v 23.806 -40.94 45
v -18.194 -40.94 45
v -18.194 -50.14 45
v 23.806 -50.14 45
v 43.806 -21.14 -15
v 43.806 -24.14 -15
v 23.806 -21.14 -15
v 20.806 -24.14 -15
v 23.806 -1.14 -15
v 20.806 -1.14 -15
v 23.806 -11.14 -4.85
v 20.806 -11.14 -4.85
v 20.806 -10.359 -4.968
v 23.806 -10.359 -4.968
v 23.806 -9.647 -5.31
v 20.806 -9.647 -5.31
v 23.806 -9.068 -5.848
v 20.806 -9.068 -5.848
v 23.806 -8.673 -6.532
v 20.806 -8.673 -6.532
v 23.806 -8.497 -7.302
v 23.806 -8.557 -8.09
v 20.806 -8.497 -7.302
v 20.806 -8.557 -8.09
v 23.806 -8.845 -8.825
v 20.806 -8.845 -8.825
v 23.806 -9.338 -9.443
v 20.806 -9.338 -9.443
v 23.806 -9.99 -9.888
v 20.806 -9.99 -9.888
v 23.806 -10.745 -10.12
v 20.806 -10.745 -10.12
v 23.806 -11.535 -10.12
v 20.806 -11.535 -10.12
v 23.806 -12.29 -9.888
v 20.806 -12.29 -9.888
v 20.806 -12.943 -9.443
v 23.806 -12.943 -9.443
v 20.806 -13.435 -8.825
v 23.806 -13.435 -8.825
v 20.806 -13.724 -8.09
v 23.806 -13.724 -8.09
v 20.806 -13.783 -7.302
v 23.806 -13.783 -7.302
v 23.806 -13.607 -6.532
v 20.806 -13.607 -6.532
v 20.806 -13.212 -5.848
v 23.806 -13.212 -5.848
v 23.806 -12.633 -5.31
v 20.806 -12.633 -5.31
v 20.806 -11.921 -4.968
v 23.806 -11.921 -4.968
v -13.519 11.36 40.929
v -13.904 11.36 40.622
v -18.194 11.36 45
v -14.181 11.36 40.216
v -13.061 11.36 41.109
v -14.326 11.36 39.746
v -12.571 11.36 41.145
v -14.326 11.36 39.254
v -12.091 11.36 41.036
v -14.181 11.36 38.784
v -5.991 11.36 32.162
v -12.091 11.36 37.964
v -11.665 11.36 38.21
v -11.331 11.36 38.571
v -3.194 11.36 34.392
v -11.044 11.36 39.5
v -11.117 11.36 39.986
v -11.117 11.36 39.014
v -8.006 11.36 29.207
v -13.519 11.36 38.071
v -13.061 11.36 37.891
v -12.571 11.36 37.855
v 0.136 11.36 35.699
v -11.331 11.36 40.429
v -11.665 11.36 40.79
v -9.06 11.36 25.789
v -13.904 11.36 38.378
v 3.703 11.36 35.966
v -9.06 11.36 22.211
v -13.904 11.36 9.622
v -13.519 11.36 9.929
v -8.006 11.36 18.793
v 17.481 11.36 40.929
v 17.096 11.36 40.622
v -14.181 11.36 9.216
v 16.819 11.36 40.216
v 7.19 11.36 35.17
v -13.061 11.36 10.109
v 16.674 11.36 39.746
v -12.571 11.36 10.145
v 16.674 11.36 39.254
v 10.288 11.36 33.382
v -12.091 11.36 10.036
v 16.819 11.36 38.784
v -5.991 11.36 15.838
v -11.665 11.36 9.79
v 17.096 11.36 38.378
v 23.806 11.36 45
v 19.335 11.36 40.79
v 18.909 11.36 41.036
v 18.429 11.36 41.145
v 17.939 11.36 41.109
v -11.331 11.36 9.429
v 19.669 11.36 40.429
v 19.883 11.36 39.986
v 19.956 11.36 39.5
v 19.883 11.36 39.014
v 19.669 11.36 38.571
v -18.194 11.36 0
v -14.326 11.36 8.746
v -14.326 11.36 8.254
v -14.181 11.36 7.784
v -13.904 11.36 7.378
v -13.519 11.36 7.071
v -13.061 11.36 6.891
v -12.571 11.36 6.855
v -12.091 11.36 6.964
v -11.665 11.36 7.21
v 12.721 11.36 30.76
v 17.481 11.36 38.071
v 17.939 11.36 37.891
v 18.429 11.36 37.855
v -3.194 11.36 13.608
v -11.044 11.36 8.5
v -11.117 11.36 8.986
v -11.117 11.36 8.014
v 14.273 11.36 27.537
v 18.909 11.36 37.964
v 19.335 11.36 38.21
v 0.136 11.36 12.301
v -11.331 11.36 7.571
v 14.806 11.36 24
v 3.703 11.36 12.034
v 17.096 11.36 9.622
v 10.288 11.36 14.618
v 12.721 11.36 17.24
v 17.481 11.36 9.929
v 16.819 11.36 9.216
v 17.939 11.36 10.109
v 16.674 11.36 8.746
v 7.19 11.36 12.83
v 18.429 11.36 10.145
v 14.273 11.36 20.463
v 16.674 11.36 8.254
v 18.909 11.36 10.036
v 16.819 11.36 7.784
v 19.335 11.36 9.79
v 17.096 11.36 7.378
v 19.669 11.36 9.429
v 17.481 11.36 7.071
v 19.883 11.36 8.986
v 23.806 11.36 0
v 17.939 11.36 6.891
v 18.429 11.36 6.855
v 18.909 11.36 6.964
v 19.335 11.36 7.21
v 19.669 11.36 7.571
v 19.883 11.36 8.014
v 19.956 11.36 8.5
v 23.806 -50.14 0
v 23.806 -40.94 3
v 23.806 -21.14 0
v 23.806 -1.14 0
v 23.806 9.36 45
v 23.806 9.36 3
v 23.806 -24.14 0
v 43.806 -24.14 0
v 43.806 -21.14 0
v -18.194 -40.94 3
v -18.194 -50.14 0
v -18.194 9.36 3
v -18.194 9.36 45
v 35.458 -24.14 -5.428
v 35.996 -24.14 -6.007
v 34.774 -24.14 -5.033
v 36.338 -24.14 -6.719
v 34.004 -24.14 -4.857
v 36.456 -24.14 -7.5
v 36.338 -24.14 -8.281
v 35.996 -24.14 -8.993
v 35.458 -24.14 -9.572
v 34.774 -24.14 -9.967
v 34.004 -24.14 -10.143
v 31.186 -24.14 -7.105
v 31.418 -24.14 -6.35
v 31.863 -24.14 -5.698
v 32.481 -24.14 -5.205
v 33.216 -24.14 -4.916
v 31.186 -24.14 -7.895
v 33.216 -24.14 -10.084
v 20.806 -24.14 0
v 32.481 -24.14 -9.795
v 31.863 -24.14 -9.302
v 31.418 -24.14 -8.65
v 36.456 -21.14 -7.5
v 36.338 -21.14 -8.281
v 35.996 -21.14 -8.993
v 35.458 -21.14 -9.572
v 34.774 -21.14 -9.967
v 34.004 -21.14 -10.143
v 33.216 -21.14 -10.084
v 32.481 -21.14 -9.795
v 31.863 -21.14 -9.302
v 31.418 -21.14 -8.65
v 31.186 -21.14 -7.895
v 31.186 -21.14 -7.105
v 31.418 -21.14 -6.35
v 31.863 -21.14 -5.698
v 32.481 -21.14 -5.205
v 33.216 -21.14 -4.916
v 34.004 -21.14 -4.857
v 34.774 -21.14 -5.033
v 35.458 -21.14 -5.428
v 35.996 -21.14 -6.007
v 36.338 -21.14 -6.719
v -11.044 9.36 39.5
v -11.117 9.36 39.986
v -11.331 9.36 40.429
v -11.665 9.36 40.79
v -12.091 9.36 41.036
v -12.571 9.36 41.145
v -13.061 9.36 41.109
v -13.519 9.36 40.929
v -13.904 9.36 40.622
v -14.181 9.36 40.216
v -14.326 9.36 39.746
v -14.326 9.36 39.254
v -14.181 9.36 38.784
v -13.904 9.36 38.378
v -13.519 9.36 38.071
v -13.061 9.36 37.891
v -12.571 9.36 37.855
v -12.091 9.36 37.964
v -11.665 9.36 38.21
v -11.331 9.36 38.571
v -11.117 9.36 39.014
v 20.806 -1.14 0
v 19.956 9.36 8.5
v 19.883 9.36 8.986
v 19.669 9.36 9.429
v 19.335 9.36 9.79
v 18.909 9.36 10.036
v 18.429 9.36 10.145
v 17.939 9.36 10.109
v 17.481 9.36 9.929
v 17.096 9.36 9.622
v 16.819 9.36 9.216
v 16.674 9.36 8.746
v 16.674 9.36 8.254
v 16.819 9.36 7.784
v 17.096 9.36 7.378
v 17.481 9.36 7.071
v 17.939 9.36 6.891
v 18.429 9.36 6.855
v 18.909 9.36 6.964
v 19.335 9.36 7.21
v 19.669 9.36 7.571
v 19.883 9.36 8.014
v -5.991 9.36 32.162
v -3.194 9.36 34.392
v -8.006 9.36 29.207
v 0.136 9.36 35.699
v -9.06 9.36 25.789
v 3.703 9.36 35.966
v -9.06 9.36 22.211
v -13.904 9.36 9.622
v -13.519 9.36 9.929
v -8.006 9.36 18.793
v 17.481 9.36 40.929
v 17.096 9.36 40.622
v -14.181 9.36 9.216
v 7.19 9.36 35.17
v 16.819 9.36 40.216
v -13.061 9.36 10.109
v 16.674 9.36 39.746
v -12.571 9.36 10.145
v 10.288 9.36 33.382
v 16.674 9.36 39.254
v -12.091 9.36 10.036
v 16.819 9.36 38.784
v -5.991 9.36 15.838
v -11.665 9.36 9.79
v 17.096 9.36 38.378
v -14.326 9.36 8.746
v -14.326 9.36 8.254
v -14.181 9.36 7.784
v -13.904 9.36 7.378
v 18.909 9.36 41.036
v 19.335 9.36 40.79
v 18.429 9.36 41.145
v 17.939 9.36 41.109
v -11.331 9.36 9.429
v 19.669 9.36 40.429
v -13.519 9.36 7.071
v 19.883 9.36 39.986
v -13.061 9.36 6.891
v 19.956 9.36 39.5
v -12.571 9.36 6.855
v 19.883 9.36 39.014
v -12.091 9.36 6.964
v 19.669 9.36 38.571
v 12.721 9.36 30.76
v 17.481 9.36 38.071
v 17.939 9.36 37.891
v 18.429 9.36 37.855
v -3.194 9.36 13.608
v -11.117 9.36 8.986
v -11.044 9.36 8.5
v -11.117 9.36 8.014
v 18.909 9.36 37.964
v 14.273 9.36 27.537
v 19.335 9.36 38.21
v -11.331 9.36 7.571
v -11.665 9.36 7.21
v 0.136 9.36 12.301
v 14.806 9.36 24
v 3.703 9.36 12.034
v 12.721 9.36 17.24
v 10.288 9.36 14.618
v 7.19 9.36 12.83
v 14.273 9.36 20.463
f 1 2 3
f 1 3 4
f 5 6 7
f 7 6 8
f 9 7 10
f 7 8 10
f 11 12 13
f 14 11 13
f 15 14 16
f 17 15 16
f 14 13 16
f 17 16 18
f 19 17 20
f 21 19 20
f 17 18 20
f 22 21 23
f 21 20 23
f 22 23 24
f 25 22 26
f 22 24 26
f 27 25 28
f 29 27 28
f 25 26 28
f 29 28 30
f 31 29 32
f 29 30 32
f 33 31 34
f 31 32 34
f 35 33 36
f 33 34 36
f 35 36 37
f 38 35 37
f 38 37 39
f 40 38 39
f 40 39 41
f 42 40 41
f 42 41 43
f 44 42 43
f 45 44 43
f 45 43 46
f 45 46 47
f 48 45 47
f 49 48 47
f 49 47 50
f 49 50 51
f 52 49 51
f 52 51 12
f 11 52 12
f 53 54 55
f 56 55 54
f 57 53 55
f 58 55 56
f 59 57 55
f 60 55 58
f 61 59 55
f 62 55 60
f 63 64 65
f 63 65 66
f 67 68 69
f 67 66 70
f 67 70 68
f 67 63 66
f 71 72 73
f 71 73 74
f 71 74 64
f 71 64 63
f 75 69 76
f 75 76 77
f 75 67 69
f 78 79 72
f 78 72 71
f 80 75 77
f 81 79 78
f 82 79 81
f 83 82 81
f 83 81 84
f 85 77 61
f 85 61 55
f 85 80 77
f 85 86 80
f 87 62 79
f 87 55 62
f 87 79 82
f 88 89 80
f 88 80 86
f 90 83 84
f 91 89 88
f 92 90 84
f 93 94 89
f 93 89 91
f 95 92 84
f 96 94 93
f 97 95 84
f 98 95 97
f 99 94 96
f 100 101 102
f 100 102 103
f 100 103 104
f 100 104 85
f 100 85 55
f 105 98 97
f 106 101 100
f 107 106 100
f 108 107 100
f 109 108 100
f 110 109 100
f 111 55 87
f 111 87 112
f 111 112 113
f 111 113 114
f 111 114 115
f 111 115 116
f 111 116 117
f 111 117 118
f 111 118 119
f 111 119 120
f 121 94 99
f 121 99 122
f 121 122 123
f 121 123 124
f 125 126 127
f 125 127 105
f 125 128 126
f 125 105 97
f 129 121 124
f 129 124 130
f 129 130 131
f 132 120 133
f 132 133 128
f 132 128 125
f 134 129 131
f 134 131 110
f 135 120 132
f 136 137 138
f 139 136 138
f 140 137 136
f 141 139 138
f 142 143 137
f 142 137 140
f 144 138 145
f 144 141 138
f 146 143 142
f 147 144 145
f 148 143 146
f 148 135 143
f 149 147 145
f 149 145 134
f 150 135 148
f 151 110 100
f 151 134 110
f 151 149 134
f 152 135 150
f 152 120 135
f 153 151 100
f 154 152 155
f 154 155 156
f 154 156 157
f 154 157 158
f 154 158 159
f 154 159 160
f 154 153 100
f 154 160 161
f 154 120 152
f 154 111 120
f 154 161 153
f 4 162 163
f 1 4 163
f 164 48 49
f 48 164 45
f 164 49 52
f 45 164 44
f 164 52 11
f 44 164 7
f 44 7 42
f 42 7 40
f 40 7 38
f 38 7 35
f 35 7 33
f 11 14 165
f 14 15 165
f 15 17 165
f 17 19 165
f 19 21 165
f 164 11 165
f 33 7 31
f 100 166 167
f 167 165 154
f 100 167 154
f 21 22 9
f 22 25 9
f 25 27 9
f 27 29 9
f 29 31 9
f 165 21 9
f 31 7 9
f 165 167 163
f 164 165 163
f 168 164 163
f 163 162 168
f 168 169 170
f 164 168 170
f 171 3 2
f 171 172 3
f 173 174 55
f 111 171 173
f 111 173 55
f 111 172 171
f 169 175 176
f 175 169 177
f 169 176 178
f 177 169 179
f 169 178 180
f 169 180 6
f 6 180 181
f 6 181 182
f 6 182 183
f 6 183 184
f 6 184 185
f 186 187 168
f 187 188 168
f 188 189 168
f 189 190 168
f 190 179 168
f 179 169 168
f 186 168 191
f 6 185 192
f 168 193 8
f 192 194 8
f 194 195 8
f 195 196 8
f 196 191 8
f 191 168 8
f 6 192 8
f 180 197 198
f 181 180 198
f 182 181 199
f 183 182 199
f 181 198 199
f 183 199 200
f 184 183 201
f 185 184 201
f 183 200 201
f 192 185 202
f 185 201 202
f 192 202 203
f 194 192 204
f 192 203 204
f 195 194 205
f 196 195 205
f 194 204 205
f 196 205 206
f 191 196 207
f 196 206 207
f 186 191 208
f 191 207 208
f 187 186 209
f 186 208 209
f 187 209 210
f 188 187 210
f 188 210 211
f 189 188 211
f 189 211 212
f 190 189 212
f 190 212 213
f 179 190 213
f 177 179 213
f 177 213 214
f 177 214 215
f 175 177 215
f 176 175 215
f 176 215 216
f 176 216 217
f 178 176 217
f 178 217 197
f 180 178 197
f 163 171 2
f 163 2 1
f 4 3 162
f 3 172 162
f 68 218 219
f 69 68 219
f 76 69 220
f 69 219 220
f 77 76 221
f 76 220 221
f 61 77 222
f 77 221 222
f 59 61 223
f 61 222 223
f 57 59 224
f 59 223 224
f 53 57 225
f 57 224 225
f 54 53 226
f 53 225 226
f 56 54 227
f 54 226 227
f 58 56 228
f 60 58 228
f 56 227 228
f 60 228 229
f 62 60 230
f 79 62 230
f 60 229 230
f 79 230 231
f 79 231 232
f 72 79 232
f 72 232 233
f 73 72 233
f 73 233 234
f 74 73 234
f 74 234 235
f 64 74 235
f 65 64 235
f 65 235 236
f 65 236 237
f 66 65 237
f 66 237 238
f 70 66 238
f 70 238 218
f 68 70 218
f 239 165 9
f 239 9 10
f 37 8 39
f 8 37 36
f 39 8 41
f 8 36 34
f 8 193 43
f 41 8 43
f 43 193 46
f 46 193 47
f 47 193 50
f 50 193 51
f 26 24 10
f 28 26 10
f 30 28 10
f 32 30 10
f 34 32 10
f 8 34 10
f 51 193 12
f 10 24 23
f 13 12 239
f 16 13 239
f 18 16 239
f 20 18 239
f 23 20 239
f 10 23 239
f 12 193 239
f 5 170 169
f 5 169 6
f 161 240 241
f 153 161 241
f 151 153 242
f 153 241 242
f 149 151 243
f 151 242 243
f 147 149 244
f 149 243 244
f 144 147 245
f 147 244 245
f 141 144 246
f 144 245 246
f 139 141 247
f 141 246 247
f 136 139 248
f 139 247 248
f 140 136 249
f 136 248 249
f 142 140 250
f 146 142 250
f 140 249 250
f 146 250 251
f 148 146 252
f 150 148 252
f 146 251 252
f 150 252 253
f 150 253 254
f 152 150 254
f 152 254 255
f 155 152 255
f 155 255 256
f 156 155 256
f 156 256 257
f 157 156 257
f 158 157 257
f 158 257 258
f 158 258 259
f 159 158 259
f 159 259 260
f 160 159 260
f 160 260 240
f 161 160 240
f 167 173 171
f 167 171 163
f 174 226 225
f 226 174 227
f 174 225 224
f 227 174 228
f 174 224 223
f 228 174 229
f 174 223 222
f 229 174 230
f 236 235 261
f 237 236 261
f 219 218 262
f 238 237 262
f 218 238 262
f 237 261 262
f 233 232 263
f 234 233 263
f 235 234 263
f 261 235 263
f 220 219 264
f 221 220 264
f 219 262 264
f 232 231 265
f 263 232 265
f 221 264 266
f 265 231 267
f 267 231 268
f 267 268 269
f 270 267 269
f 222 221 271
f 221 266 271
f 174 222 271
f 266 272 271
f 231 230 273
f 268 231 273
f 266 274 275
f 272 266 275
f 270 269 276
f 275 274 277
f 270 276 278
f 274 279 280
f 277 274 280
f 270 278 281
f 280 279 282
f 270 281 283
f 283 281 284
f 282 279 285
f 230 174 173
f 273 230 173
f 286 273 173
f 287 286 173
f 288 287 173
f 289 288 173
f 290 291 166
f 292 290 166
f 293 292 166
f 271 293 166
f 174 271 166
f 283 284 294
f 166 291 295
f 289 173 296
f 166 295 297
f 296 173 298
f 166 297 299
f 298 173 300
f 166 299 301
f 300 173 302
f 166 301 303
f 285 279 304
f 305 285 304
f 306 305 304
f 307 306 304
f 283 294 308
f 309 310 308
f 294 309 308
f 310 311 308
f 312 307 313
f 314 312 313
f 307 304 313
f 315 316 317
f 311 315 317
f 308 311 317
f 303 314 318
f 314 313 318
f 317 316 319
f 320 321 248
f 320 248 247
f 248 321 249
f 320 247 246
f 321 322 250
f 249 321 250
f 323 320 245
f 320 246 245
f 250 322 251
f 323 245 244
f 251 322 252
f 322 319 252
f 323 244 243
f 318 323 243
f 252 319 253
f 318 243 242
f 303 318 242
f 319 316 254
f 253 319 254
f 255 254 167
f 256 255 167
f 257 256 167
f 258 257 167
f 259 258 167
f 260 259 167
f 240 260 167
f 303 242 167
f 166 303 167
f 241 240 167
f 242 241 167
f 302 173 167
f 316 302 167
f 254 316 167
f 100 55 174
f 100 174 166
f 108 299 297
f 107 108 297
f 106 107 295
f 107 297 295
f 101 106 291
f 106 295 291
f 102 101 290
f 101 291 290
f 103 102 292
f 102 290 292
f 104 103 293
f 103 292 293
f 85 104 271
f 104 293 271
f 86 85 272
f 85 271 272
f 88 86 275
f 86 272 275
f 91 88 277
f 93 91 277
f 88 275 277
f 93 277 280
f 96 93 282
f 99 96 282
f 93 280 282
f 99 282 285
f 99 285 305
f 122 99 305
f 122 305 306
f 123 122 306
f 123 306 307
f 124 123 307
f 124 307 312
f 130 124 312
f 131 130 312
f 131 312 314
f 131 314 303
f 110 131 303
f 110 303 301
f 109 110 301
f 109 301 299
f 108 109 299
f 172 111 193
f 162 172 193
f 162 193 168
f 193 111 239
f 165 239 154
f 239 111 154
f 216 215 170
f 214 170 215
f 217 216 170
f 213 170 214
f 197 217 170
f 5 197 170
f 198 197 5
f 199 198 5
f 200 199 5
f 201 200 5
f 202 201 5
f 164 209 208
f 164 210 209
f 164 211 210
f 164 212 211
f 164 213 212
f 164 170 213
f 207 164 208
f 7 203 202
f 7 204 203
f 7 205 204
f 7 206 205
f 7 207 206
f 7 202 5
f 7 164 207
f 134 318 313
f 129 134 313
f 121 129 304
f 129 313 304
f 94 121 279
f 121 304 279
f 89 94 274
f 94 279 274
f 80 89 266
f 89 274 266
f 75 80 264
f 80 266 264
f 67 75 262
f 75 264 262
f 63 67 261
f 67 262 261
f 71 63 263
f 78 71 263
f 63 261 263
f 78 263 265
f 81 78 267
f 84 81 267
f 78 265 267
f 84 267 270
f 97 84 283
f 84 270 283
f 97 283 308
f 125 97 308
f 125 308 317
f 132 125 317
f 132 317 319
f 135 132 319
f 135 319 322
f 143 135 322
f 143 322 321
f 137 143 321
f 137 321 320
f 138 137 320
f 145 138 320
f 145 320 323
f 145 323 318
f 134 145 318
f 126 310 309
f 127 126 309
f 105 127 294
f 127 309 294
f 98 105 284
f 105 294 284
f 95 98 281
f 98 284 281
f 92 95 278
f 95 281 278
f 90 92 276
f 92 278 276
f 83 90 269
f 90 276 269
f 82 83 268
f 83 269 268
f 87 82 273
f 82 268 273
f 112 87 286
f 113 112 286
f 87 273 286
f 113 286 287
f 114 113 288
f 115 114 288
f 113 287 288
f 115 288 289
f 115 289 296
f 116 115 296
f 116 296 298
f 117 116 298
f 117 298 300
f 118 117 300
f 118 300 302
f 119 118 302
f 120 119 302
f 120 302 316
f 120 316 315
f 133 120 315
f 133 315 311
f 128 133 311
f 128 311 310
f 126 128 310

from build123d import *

# Parameters (mm, degrees)
SKETCH_1_W          = 42
SKETCH_1_H          = 61.5
EXTRUDE_1_DEPTH     = 3
SKETCH_2_W          = 42
SKETCH_2_H          = 9.2
SKETCH_2_H_2        = 2
EXTRUDE_2_DEPTH     = 42
SKETCH_3_R          = 12
SKETCH_3_R_2        = 1.65
CUT_EXTRUDE_1_DEPTH = 3
EXTRUDE_3_DEPTH     = 15
SKETCH_6_R          = 2.65
CUT_EXTRUDE_2_DEPTH = 5
SKETCH_7_W          = 15
SKETCH_7_H          = 3
EXTRUDE_4_DEPTH     = 20
SKETCH_8_R          = 2.65
CUT_EXTRUDE_3_DEPTH = 20


with BuildPart() as part:
    # 草图1 → 凸台-拉伸1 (new body)
    with BuildSketch(Plane.XY):
        with Locations((2.806034483, -19.390086207)):
            Rectangle(SKETCH_1_W, SKETCH_1_H)
    extrude(amount=EXTRUDE_1_DEPTH)

    # 草图2 → 凸台-拉伸2 (add)
    with BuildSketch(Plane.XY.offset(3)):
        with Locations((2.806034483, -45.540086207)):
            Rectangle(SKETCH_2_W, SKETCH_2_H)
        with Locations((2.806034483, 10.359913793)):
            Rectangle(SKETCH_2_W, SKETCH_2_H_2)
    extrude(amount=EXTRUDE_2_DEPTH)

    # 草图3 → 切除-拉伸1 (cut, through all)
    with BuildSketch(Plane.XZ.offset(-9.359913793)):
        with Locations((2.806034483, 24)):
            Circle(SKETCH_3_R)
        with Locations((18.306034483, 39.5)):
            Circle(SKETCH_3_R_2)
        with Locations((18.306034483, 8.5)):
            Circle(SKETCH_3_R_2)
        with Locations((-12.693965517, 8.5)):
            Circle(SKETCH_3_R_2)
        with Locations((-12.693965517, 39.5)):
            Circle(SKETCH_3_R_2)
    extrude(amount=-CUT_EXTRUDE_1_DEPTH, mode=Mode.SUBTRACT)

    # 草图4 → 凸台-拉伸3 (add)
    with BuildSketch(Plane(origin=(0, 0, 0), x_dir=(-1, 0, 0), z_dir=(0, 0, -1))):
        Polygon((-23.806034483, -21.140086207), (-23.806034483, -1.140086207), (-20.806034483, -1.140086207), (-20.806034483, -21.140086207), (-20.806034483, -24.140086207), (-23.806034483, -24.140086207), align=None)
    extrude(amount=EXTRUDE_3_DEPTH)

    # 草图6 → 切除-拉伸2 (cut)
    with BuildSketch(Plane.ZY.offset(-20.806034483)):
        with Locations((-7.5, -11.140086207)):
            Circle(SKETCH_6_R)
    extrude(amount=-CUT_EXTRUDE_2_DEPTH, mode=Mode.SUBTRACT)

    # 草图7 → 凸台-拉伸4 (add)
    with BuildSketch(Plane(origin=(23.806034483, 0, 0), x_dir=(0, 0, -1), z_dir=(1, 0, 0))):
        with Locations((7.5, -22.640086207)):
            Rectangle(SKETCH_7_W, SKETCH_7_H)
    extrude(amount=EXTRUDE_4_DEPTH)

    # 草图8 → 切除-拉伸3 (cut)
    with BuildSketch(Plane(origin=(0, -21.140086207, 0), x_dir=(1, 0, 0), z_dir=(0, 1, 0))):
        with Locations((33.806034483, 7.5)):
            Circle(SKETCH_8_R)
    extrude(amount=-CUT_EXTRUDE_3_DEPTH, mode=Mode.SUBTRACT)


solid = part.part
